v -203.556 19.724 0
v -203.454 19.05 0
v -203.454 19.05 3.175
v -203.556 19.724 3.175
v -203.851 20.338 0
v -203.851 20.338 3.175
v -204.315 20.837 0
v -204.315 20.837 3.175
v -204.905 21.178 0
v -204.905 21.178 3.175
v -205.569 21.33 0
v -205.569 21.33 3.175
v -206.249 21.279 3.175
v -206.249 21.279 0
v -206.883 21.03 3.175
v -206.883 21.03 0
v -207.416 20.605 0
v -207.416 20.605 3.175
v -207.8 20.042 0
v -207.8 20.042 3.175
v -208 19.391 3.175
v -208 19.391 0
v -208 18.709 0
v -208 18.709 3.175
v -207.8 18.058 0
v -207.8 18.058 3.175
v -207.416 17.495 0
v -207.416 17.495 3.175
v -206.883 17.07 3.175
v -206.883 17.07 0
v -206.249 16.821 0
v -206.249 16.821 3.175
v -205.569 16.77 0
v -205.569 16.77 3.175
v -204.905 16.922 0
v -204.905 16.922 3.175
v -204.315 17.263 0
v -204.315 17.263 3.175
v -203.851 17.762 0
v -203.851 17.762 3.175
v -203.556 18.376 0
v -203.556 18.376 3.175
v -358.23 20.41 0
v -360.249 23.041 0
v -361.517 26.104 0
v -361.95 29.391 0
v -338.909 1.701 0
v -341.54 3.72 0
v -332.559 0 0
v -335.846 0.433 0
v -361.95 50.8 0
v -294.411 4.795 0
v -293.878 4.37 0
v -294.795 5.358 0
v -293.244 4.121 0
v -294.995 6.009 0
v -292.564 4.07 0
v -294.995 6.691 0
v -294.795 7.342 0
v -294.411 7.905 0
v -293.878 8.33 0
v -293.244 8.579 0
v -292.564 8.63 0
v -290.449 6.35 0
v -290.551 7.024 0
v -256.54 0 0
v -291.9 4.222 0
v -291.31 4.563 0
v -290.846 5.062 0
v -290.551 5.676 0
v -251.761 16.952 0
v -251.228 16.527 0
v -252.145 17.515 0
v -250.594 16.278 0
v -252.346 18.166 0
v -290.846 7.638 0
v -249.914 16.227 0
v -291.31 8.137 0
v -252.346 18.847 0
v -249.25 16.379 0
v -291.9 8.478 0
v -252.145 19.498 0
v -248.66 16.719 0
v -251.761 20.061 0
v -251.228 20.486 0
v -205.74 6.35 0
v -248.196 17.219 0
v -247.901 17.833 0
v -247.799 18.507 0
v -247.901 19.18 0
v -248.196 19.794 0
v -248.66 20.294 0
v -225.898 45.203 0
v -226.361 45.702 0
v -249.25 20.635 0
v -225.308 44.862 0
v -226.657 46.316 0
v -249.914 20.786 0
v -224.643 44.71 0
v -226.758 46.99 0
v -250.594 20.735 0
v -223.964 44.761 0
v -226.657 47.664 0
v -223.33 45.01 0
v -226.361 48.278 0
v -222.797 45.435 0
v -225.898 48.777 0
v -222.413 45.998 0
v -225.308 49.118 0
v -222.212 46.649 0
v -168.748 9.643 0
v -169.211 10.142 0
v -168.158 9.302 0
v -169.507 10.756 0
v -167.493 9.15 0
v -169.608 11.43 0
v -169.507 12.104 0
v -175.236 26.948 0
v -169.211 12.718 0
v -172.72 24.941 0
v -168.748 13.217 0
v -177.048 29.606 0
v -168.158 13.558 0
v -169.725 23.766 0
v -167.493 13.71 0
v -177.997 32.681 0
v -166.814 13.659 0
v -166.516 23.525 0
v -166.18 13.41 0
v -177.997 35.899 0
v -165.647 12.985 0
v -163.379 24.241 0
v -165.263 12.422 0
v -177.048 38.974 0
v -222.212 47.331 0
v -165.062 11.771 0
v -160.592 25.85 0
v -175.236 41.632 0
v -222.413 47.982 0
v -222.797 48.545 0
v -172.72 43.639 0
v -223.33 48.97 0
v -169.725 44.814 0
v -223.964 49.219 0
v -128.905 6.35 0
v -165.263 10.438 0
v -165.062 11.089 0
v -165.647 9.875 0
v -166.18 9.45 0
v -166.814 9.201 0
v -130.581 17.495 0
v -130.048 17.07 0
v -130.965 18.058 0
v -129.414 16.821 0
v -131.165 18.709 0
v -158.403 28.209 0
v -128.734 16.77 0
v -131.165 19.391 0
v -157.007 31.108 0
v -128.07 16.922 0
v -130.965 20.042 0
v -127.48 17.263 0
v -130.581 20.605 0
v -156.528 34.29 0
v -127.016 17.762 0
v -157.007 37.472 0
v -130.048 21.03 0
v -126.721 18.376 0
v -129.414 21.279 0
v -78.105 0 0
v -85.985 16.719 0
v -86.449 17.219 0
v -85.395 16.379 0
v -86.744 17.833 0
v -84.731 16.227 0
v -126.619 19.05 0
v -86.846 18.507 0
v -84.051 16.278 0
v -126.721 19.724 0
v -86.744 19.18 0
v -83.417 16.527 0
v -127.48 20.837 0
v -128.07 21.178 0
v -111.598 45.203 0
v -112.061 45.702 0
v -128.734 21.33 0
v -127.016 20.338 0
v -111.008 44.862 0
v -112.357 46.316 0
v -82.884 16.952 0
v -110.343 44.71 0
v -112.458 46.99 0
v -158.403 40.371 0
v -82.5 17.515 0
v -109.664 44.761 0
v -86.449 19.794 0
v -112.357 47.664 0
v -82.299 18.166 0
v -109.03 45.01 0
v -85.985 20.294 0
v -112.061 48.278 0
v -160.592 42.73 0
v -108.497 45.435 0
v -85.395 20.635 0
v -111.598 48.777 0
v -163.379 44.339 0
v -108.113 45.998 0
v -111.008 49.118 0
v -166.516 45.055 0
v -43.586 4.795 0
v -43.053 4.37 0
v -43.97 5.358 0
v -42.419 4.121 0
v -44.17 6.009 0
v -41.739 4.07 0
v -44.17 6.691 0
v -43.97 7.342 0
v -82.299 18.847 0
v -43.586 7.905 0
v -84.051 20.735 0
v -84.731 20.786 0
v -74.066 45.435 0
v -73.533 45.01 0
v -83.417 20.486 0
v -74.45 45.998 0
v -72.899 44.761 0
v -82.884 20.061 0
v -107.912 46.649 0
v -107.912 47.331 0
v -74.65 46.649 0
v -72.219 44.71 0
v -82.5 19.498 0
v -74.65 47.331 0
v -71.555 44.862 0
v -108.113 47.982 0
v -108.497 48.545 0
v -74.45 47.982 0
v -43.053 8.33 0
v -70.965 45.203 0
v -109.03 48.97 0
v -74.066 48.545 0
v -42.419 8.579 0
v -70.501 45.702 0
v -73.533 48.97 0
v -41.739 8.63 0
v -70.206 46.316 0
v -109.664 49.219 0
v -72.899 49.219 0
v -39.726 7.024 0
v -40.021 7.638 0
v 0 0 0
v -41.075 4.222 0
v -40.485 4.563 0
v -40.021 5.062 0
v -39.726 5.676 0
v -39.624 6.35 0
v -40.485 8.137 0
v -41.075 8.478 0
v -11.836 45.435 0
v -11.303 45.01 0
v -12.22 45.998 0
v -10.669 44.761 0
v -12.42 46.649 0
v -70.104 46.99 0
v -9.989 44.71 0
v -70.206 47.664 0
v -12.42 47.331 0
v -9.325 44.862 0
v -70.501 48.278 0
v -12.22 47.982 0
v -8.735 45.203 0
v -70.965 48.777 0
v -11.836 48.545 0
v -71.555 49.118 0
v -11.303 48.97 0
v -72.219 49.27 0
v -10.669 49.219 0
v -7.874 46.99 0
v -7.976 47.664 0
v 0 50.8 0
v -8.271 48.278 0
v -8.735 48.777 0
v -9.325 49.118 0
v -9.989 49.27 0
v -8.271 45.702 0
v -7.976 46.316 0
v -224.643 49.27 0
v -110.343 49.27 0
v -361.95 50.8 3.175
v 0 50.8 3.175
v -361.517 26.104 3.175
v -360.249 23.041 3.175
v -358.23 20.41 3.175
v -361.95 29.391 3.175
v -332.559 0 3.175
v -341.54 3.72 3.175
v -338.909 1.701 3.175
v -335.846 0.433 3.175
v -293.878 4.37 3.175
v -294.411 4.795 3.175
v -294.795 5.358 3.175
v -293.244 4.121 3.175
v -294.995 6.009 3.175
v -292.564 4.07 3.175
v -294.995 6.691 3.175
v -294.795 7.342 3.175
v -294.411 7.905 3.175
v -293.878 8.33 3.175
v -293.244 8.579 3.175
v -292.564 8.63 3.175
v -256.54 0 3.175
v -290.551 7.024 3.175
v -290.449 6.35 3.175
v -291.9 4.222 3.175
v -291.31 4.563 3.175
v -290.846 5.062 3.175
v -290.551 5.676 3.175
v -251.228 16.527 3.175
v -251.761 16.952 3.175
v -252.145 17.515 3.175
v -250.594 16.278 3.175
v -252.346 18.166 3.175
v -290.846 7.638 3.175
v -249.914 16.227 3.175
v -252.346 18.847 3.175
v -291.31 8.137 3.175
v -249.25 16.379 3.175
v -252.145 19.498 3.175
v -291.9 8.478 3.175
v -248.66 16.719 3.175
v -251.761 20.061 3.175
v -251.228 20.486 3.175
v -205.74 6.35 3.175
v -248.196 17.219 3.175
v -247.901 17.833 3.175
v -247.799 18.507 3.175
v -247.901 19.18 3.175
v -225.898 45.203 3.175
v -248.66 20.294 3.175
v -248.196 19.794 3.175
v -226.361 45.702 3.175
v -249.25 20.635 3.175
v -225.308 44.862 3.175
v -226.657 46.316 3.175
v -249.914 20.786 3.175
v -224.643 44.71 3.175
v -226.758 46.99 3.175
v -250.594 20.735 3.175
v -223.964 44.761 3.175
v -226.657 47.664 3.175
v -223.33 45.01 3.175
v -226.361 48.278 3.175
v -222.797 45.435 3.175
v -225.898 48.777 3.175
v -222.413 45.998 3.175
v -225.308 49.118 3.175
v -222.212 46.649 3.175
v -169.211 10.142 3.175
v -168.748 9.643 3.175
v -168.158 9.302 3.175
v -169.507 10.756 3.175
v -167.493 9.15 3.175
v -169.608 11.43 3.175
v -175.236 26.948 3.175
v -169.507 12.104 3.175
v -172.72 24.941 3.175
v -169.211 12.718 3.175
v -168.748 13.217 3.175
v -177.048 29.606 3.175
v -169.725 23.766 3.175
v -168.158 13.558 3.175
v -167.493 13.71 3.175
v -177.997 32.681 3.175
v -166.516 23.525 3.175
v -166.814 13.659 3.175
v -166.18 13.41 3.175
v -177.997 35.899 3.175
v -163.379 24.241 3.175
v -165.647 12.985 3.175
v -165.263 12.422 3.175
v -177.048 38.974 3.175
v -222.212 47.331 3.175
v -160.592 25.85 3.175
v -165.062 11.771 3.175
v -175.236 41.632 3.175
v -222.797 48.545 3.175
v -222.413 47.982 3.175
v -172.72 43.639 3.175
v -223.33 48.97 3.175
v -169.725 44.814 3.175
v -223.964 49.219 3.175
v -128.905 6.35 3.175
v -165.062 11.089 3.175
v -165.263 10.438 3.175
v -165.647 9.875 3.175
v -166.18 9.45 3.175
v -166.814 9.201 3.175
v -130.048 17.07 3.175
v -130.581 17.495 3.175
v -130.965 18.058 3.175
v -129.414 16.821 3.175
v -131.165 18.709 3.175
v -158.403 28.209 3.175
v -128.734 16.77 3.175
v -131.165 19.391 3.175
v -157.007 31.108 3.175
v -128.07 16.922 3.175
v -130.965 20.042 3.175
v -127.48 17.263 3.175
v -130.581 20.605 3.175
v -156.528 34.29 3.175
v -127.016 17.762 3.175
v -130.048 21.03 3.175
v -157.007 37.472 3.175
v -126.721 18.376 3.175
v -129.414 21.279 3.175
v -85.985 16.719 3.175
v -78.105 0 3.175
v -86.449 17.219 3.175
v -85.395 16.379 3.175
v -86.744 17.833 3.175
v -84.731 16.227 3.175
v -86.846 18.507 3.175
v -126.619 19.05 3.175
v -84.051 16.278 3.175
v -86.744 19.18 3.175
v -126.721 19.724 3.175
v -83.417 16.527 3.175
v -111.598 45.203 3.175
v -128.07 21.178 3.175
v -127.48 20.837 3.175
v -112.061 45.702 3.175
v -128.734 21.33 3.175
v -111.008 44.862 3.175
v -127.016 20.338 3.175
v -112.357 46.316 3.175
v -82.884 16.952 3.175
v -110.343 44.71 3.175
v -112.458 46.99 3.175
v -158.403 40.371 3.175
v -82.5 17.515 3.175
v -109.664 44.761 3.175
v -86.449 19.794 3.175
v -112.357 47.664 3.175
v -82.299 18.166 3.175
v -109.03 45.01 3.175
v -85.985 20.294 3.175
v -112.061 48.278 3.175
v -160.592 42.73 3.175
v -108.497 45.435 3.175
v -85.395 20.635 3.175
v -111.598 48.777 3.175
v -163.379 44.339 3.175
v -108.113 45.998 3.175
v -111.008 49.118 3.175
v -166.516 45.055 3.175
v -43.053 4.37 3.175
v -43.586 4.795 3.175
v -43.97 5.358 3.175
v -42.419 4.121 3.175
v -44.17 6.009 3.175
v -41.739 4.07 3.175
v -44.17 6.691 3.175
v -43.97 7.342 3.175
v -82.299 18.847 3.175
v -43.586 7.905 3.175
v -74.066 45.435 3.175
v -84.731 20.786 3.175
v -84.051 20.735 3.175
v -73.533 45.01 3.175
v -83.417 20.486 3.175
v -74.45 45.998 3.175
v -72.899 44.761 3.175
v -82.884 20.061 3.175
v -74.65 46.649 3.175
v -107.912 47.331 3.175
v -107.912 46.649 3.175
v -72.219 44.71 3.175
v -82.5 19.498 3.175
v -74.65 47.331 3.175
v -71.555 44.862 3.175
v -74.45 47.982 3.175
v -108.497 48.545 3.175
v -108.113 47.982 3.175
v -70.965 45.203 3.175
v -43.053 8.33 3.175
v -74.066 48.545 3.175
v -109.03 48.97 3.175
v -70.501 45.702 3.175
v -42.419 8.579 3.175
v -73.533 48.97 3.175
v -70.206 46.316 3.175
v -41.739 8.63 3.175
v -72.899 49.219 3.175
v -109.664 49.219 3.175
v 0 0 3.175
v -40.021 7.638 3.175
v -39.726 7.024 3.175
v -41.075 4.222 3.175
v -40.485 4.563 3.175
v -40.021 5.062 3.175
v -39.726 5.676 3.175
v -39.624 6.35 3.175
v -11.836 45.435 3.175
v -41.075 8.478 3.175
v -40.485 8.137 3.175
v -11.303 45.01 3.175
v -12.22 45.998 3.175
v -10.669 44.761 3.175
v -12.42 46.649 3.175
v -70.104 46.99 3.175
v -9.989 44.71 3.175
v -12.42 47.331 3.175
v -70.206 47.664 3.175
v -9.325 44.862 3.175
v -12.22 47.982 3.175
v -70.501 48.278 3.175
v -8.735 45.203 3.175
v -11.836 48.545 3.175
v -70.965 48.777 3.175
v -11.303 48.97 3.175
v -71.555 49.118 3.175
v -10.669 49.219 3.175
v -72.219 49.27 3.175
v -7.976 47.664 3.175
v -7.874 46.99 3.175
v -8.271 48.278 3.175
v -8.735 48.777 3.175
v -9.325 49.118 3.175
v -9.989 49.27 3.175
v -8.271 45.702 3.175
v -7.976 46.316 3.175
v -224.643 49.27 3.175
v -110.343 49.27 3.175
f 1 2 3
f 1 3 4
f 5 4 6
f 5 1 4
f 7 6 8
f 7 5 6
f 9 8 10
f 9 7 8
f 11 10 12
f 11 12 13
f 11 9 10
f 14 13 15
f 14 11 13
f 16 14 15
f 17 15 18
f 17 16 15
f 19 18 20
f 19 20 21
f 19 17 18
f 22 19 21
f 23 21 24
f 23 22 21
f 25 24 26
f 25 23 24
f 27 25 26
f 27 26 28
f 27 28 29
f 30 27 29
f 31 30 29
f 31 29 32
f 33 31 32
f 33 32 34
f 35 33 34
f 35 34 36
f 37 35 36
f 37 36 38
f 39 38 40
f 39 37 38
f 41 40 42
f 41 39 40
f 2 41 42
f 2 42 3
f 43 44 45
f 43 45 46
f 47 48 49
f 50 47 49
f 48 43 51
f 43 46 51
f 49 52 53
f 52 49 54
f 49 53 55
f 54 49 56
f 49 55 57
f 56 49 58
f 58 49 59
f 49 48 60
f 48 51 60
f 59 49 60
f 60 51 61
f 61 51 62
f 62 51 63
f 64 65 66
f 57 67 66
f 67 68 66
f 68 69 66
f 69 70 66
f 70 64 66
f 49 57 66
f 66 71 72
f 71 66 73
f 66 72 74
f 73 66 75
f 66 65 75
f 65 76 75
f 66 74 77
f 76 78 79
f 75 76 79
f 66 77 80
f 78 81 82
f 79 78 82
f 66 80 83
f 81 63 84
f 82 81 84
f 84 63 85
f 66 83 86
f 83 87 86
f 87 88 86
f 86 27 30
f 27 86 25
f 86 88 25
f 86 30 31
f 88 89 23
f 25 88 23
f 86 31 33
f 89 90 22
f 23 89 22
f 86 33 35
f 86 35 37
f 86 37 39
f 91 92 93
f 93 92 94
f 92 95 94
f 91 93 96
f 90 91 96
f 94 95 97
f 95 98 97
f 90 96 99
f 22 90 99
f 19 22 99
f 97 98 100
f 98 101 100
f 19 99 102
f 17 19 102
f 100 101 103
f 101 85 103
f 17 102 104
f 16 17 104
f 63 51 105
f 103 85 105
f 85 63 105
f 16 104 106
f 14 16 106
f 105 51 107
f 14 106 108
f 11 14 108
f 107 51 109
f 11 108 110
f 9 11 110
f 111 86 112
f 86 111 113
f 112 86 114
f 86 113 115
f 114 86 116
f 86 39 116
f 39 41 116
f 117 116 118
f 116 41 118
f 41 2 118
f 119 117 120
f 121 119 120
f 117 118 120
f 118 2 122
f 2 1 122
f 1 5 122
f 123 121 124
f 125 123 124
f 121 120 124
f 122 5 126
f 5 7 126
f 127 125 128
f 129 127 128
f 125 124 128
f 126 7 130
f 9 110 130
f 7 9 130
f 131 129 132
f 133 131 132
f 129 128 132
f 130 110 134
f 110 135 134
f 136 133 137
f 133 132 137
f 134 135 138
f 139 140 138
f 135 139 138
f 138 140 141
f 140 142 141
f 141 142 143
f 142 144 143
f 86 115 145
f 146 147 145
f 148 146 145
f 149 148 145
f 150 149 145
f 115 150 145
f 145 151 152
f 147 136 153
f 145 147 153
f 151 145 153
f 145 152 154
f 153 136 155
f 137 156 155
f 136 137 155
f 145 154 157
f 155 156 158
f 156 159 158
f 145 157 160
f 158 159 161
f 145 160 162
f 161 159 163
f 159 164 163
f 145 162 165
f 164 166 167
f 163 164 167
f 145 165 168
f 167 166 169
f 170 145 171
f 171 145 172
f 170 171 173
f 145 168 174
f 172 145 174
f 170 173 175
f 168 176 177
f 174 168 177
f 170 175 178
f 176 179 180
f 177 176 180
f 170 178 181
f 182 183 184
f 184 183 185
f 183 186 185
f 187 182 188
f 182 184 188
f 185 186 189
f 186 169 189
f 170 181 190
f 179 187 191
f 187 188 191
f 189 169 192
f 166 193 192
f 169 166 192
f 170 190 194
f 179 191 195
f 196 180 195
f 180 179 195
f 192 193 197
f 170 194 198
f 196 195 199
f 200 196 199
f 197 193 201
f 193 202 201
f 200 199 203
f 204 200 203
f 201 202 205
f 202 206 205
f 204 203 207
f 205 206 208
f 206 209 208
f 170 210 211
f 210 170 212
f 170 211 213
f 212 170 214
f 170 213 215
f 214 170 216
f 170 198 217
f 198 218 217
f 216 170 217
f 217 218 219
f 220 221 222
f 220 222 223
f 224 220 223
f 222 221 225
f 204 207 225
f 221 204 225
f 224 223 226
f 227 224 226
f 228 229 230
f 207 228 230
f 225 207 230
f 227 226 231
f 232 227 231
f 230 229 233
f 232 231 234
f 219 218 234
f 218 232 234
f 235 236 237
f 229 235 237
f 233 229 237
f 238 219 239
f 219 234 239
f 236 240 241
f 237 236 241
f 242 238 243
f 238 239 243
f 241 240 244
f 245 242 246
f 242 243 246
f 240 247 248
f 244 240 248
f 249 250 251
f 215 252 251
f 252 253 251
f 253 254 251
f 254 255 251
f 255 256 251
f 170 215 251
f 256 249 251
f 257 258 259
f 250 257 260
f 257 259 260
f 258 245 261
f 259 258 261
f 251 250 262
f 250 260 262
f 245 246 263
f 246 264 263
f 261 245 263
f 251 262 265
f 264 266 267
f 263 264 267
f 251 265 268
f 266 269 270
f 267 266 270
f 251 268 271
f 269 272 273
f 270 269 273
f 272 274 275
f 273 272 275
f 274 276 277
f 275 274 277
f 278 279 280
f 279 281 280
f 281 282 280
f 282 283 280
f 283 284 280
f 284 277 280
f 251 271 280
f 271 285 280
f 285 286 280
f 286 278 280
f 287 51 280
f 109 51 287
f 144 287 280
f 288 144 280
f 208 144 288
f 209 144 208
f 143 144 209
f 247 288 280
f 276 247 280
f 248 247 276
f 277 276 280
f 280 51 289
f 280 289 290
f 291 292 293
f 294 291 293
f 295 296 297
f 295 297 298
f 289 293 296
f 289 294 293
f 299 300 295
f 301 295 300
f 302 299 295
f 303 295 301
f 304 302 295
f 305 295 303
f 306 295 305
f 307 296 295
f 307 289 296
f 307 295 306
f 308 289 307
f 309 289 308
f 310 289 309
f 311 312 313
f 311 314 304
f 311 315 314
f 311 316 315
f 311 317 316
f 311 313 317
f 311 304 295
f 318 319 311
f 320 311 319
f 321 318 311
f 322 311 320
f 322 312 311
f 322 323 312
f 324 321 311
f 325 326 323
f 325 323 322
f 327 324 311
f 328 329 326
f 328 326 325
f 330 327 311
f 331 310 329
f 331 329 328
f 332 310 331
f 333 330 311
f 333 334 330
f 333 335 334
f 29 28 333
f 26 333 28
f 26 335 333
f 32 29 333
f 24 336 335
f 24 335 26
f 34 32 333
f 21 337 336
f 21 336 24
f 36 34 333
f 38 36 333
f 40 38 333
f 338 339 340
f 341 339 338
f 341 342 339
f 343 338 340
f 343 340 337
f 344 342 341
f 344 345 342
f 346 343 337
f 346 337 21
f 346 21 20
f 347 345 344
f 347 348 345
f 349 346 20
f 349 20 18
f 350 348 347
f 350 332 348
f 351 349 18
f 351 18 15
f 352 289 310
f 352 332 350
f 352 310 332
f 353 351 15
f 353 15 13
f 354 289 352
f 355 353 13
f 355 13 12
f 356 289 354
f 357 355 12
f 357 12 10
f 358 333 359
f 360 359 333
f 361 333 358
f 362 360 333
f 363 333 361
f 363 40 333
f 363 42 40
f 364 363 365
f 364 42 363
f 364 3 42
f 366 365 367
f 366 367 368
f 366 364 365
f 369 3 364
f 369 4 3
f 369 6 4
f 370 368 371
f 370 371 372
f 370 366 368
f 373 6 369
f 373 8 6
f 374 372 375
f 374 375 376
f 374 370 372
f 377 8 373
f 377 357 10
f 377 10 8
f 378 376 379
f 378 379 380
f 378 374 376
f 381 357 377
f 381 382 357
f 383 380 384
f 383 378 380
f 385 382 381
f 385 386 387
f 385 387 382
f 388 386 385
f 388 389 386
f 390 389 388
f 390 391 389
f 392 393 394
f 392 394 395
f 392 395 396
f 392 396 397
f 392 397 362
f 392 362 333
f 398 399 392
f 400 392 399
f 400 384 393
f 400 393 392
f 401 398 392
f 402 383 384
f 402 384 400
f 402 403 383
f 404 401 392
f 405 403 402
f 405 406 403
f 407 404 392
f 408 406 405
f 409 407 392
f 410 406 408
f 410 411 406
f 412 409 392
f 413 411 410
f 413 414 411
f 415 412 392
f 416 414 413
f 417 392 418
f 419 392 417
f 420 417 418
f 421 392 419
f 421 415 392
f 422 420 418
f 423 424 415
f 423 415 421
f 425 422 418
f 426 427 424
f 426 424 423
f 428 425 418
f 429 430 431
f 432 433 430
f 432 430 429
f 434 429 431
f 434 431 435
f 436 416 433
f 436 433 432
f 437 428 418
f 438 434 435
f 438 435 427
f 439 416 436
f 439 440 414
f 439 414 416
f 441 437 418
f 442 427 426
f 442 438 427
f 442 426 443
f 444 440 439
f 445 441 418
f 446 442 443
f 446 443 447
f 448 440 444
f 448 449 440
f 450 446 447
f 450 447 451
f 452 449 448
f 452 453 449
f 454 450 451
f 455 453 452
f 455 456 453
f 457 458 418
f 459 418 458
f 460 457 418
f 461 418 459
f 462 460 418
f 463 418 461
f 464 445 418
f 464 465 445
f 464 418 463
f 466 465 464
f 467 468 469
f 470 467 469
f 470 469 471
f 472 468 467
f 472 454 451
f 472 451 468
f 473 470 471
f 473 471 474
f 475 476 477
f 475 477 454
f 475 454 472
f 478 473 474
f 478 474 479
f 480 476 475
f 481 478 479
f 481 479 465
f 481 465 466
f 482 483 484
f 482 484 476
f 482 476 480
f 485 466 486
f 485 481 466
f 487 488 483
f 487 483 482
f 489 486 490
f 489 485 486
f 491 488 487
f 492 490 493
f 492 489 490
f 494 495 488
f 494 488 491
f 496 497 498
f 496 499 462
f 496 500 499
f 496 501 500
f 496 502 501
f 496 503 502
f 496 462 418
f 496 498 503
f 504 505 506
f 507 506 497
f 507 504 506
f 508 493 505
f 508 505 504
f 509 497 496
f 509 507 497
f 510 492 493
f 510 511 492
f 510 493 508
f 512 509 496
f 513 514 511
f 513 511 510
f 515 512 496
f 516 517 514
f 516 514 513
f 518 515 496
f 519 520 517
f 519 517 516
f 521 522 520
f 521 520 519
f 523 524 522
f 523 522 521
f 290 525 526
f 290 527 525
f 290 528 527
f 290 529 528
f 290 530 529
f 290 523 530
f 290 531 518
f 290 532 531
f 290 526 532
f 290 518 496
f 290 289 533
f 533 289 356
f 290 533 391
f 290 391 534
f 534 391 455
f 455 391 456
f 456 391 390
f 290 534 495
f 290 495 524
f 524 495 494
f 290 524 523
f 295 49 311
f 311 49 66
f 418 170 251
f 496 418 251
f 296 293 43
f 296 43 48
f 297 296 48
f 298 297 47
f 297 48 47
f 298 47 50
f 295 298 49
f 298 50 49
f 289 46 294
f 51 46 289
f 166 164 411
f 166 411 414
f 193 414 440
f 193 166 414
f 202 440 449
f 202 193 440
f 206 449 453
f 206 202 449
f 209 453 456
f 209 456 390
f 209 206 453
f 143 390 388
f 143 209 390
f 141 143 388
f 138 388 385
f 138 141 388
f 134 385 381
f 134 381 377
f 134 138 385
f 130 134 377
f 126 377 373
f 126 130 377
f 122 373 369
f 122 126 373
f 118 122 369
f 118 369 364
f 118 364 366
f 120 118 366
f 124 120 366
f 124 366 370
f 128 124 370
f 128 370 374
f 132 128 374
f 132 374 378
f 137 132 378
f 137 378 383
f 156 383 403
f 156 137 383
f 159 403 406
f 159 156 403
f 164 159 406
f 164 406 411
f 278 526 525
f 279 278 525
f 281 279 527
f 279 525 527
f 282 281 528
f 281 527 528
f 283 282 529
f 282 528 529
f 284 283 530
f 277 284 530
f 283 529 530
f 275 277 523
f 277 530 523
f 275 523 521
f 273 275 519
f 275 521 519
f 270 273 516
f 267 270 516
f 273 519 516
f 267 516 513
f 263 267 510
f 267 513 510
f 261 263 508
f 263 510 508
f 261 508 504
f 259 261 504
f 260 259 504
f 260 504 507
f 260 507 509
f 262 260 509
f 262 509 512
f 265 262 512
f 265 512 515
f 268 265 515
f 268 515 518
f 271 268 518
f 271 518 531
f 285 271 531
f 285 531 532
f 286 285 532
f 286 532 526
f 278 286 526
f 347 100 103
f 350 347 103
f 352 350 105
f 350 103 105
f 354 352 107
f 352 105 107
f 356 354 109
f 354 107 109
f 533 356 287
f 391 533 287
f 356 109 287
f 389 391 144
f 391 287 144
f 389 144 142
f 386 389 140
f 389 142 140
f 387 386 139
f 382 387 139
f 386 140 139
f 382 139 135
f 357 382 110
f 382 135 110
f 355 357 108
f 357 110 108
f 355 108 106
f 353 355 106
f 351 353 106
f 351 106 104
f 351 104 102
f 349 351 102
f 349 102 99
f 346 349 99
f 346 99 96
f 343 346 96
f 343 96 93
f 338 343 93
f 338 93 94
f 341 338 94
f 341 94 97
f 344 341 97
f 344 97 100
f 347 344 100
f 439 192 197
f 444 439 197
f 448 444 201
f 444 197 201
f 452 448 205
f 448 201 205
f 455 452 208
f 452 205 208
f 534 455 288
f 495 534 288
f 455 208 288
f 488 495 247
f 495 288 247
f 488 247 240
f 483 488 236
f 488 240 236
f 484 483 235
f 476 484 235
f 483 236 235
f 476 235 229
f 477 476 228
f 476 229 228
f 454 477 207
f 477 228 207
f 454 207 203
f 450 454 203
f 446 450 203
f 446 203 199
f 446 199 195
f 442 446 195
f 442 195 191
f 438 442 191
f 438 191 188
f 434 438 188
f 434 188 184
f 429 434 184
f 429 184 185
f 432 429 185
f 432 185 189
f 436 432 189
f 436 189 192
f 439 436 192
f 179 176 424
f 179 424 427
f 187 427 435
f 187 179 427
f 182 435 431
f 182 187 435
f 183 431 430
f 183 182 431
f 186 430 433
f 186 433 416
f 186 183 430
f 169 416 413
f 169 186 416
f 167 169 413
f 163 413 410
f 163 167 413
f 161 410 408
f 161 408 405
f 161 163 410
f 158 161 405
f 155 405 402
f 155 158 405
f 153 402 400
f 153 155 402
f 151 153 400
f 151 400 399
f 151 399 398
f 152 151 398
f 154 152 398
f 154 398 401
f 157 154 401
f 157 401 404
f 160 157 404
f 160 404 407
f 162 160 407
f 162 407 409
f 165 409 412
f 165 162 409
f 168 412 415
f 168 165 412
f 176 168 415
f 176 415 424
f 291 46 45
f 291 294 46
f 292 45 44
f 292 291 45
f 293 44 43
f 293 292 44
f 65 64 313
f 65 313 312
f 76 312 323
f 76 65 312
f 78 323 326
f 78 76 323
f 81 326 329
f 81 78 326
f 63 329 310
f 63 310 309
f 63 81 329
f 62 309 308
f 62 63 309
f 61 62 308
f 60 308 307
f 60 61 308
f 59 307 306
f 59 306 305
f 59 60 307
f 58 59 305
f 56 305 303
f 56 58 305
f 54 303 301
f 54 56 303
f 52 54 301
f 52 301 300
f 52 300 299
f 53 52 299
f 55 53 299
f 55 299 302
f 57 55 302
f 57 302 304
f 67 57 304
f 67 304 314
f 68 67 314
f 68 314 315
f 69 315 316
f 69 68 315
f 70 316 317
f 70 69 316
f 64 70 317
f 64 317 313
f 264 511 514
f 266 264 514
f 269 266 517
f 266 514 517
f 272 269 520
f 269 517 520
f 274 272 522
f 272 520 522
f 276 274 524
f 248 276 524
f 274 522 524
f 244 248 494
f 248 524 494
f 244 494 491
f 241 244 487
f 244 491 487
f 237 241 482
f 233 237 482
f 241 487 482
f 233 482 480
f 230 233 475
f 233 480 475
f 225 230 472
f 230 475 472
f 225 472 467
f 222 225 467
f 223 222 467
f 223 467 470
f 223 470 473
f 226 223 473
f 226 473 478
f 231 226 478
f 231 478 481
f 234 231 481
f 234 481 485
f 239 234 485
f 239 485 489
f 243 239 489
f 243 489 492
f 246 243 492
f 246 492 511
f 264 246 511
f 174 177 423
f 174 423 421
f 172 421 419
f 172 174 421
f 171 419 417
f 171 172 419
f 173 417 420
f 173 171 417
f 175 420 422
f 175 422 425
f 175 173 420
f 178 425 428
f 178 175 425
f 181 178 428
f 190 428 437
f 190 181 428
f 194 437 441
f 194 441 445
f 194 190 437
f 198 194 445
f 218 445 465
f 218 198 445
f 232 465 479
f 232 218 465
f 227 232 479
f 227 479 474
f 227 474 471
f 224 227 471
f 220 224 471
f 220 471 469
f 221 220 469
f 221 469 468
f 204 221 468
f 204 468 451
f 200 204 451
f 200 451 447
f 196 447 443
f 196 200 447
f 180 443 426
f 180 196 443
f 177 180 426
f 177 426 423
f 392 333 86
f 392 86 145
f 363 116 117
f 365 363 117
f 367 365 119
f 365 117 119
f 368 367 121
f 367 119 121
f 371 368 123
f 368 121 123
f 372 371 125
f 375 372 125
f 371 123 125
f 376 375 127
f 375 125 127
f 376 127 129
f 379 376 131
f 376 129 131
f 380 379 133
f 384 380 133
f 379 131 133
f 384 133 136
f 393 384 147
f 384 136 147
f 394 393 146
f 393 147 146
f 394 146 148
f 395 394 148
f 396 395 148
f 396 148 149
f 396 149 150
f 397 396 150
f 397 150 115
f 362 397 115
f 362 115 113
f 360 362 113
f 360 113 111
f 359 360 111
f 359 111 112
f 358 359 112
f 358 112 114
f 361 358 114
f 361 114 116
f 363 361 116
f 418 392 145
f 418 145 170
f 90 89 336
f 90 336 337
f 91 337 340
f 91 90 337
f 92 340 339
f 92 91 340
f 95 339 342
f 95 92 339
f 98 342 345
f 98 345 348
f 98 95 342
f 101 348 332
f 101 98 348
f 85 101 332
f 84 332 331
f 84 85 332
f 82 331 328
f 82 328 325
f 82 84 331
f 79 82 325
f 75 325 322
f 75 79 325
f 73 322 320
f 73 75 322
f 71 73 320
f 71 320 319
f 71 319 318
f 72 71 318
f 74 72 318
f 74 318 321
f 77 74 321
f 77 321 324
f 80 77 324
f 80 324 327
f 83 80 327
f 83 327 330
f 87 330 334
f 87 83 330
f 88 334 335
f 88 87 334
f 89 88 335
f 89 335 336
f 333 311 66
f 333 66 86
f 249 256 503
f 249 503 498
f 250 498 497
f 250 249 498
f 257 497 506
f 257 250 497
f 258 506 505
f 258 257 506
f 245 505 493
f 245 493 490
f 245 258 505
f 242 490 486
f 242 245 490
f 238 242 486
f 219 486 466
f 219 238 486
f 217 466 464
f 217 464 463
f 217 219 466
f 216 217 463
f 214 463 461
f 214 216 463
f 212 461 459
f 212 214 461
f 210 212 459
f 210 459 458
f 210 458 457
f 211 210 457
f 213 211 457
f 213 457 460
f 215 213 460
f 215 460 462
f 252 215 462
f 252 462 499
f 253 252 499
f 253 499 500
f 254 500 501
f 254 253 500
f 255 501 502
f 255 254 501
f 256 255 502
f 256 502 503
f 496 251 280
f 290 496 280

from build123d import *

# Parameters (mm, degrees)
SKETCH1_W           = 361.95
SKETCH1_H           = 50.8
SKETCH1_R           = 2.286
SKETCH1_R_2         = 10.795
BOSS_EXTRUDE1_DEPTH = 3.175
CUT_EXTRUDE1_DEPTH  = 366.511317369
FILLET1_R           = 12.7
CUT_EXTRUDE2_DEPTH  = 366.511317369
SKETCH4_R           = 2.286
CUT_EXTRUDE3_DEPTH  = 366.511317369
SKETCH6_R           = 2.286
CUT_EXTRUDE4_DEPTH  = 366.511317369


with BuildPart() as part:
    # Sketch1 → Boss-Extrude1 (new body)
    with BuildSketch(Plane.XY):
        with Locations((-180.975, 25.4)):
            Rectangle(SKETCH1_W, SKETCH1_H)
        with Locations((-41.91, 6.35)):
            Circle(SKETCH1_R, mode=Mode.SUBTRACT)
        with Locations((-292.735, 6.35)):
            Circle(SKETCH1_R, mode=Mode.SUBTRACT)
        with Locations((-128.905, 19.05)):
            Circle(SKETCH1_R, mode=Mode.SUBTRACT)
        with Locations((-205.74, 19.05)):
            Circle(SKETCH1_R, mode=Mode.SUBTRACT)
        with Locations((-167.3225, 34.29)):
            Circle(SKETCH1_R_2, mode=Mode.SUBTRACT)
        with Locations((-250.085181934, 18.50662125)):
            Circle(SKETCH1_R, mode=Mode.SUBTRACT)
        with Locations(Location((-84.559818066, 18.50662125, 0), (0, 0, 180))):
            Circle(SKETCH1_R, mode=Mode.SUBTRACT)
    extrude(amount=BOSS_EXTRUDE1_DEPTH)

    # Sketch2 → Cut-Extrude1 (cut, through all)
    with BuildSketch(Plane.XY.offset(3.175)):
        Polygon((-388.62, 50.8), (-337.82, 0), (-388.62, 0), align=None)
    extrude(amount=-CUT_EXTRUDE1_DEPTH, mode=Mode.SUBTRACT)

    # Fillet1
    fillet1_edges = [part.edges().sort_by_distance(p)[0] for p in [
        (-337.82, 0, 1.5875),
        (-361.95, 24.13, 1.5875),
    ]]
    fillet(fillet1_edges, radius=FILLET1_R)

    # Sketch3 → Cut-Extrude2 (cut, through all)
    with BuildSketch(Plane.XY.offset(3.175)):
        Polygon((-256.54, 0), (-205.74, 6.35), (-128.905, 6.35), (-78.105, 0), align=None)
    extrude(amount=-CUT_EXTRUDE2_DEPTH, mode=Mode.SUBTRACT)

    # Sketch4 → Cut-Extrude3 (cut, through all)
    with BuildSketch(Plane(origin=(0, 0, 0), x_dir=(-1, 0, 0), z_dir=(0, 0, -1))):
        with Locations((110.1725, 46.99)):
            Circle(SKETCH4_R)
        with Locations((167.3225, 11.43)):
            Circle(SKETCH4_R)
        with Locations((224.4725, 46.99)):
            Circle(SKETCH4_R)
    extrude(amount=-CUT_EXTRUDE3_DEPTH, mode=Mode.SUBTRACT)

    # Sketch6 → Cut-Extrude4 (cut, through all)
    with BuildSketch(Plane.XY.offset(3.175)):
        with Locations((-72.39, 46.99)):
            Circle(SKETCH6_R)
        with Locations((-10.16, 46.99)):
            Circle(SKETCH6_R)
    extrude(amount=-CUT_EXTRUDE4_DEPTH, mode=Mode.SUBTRACT)


solid = part.part
